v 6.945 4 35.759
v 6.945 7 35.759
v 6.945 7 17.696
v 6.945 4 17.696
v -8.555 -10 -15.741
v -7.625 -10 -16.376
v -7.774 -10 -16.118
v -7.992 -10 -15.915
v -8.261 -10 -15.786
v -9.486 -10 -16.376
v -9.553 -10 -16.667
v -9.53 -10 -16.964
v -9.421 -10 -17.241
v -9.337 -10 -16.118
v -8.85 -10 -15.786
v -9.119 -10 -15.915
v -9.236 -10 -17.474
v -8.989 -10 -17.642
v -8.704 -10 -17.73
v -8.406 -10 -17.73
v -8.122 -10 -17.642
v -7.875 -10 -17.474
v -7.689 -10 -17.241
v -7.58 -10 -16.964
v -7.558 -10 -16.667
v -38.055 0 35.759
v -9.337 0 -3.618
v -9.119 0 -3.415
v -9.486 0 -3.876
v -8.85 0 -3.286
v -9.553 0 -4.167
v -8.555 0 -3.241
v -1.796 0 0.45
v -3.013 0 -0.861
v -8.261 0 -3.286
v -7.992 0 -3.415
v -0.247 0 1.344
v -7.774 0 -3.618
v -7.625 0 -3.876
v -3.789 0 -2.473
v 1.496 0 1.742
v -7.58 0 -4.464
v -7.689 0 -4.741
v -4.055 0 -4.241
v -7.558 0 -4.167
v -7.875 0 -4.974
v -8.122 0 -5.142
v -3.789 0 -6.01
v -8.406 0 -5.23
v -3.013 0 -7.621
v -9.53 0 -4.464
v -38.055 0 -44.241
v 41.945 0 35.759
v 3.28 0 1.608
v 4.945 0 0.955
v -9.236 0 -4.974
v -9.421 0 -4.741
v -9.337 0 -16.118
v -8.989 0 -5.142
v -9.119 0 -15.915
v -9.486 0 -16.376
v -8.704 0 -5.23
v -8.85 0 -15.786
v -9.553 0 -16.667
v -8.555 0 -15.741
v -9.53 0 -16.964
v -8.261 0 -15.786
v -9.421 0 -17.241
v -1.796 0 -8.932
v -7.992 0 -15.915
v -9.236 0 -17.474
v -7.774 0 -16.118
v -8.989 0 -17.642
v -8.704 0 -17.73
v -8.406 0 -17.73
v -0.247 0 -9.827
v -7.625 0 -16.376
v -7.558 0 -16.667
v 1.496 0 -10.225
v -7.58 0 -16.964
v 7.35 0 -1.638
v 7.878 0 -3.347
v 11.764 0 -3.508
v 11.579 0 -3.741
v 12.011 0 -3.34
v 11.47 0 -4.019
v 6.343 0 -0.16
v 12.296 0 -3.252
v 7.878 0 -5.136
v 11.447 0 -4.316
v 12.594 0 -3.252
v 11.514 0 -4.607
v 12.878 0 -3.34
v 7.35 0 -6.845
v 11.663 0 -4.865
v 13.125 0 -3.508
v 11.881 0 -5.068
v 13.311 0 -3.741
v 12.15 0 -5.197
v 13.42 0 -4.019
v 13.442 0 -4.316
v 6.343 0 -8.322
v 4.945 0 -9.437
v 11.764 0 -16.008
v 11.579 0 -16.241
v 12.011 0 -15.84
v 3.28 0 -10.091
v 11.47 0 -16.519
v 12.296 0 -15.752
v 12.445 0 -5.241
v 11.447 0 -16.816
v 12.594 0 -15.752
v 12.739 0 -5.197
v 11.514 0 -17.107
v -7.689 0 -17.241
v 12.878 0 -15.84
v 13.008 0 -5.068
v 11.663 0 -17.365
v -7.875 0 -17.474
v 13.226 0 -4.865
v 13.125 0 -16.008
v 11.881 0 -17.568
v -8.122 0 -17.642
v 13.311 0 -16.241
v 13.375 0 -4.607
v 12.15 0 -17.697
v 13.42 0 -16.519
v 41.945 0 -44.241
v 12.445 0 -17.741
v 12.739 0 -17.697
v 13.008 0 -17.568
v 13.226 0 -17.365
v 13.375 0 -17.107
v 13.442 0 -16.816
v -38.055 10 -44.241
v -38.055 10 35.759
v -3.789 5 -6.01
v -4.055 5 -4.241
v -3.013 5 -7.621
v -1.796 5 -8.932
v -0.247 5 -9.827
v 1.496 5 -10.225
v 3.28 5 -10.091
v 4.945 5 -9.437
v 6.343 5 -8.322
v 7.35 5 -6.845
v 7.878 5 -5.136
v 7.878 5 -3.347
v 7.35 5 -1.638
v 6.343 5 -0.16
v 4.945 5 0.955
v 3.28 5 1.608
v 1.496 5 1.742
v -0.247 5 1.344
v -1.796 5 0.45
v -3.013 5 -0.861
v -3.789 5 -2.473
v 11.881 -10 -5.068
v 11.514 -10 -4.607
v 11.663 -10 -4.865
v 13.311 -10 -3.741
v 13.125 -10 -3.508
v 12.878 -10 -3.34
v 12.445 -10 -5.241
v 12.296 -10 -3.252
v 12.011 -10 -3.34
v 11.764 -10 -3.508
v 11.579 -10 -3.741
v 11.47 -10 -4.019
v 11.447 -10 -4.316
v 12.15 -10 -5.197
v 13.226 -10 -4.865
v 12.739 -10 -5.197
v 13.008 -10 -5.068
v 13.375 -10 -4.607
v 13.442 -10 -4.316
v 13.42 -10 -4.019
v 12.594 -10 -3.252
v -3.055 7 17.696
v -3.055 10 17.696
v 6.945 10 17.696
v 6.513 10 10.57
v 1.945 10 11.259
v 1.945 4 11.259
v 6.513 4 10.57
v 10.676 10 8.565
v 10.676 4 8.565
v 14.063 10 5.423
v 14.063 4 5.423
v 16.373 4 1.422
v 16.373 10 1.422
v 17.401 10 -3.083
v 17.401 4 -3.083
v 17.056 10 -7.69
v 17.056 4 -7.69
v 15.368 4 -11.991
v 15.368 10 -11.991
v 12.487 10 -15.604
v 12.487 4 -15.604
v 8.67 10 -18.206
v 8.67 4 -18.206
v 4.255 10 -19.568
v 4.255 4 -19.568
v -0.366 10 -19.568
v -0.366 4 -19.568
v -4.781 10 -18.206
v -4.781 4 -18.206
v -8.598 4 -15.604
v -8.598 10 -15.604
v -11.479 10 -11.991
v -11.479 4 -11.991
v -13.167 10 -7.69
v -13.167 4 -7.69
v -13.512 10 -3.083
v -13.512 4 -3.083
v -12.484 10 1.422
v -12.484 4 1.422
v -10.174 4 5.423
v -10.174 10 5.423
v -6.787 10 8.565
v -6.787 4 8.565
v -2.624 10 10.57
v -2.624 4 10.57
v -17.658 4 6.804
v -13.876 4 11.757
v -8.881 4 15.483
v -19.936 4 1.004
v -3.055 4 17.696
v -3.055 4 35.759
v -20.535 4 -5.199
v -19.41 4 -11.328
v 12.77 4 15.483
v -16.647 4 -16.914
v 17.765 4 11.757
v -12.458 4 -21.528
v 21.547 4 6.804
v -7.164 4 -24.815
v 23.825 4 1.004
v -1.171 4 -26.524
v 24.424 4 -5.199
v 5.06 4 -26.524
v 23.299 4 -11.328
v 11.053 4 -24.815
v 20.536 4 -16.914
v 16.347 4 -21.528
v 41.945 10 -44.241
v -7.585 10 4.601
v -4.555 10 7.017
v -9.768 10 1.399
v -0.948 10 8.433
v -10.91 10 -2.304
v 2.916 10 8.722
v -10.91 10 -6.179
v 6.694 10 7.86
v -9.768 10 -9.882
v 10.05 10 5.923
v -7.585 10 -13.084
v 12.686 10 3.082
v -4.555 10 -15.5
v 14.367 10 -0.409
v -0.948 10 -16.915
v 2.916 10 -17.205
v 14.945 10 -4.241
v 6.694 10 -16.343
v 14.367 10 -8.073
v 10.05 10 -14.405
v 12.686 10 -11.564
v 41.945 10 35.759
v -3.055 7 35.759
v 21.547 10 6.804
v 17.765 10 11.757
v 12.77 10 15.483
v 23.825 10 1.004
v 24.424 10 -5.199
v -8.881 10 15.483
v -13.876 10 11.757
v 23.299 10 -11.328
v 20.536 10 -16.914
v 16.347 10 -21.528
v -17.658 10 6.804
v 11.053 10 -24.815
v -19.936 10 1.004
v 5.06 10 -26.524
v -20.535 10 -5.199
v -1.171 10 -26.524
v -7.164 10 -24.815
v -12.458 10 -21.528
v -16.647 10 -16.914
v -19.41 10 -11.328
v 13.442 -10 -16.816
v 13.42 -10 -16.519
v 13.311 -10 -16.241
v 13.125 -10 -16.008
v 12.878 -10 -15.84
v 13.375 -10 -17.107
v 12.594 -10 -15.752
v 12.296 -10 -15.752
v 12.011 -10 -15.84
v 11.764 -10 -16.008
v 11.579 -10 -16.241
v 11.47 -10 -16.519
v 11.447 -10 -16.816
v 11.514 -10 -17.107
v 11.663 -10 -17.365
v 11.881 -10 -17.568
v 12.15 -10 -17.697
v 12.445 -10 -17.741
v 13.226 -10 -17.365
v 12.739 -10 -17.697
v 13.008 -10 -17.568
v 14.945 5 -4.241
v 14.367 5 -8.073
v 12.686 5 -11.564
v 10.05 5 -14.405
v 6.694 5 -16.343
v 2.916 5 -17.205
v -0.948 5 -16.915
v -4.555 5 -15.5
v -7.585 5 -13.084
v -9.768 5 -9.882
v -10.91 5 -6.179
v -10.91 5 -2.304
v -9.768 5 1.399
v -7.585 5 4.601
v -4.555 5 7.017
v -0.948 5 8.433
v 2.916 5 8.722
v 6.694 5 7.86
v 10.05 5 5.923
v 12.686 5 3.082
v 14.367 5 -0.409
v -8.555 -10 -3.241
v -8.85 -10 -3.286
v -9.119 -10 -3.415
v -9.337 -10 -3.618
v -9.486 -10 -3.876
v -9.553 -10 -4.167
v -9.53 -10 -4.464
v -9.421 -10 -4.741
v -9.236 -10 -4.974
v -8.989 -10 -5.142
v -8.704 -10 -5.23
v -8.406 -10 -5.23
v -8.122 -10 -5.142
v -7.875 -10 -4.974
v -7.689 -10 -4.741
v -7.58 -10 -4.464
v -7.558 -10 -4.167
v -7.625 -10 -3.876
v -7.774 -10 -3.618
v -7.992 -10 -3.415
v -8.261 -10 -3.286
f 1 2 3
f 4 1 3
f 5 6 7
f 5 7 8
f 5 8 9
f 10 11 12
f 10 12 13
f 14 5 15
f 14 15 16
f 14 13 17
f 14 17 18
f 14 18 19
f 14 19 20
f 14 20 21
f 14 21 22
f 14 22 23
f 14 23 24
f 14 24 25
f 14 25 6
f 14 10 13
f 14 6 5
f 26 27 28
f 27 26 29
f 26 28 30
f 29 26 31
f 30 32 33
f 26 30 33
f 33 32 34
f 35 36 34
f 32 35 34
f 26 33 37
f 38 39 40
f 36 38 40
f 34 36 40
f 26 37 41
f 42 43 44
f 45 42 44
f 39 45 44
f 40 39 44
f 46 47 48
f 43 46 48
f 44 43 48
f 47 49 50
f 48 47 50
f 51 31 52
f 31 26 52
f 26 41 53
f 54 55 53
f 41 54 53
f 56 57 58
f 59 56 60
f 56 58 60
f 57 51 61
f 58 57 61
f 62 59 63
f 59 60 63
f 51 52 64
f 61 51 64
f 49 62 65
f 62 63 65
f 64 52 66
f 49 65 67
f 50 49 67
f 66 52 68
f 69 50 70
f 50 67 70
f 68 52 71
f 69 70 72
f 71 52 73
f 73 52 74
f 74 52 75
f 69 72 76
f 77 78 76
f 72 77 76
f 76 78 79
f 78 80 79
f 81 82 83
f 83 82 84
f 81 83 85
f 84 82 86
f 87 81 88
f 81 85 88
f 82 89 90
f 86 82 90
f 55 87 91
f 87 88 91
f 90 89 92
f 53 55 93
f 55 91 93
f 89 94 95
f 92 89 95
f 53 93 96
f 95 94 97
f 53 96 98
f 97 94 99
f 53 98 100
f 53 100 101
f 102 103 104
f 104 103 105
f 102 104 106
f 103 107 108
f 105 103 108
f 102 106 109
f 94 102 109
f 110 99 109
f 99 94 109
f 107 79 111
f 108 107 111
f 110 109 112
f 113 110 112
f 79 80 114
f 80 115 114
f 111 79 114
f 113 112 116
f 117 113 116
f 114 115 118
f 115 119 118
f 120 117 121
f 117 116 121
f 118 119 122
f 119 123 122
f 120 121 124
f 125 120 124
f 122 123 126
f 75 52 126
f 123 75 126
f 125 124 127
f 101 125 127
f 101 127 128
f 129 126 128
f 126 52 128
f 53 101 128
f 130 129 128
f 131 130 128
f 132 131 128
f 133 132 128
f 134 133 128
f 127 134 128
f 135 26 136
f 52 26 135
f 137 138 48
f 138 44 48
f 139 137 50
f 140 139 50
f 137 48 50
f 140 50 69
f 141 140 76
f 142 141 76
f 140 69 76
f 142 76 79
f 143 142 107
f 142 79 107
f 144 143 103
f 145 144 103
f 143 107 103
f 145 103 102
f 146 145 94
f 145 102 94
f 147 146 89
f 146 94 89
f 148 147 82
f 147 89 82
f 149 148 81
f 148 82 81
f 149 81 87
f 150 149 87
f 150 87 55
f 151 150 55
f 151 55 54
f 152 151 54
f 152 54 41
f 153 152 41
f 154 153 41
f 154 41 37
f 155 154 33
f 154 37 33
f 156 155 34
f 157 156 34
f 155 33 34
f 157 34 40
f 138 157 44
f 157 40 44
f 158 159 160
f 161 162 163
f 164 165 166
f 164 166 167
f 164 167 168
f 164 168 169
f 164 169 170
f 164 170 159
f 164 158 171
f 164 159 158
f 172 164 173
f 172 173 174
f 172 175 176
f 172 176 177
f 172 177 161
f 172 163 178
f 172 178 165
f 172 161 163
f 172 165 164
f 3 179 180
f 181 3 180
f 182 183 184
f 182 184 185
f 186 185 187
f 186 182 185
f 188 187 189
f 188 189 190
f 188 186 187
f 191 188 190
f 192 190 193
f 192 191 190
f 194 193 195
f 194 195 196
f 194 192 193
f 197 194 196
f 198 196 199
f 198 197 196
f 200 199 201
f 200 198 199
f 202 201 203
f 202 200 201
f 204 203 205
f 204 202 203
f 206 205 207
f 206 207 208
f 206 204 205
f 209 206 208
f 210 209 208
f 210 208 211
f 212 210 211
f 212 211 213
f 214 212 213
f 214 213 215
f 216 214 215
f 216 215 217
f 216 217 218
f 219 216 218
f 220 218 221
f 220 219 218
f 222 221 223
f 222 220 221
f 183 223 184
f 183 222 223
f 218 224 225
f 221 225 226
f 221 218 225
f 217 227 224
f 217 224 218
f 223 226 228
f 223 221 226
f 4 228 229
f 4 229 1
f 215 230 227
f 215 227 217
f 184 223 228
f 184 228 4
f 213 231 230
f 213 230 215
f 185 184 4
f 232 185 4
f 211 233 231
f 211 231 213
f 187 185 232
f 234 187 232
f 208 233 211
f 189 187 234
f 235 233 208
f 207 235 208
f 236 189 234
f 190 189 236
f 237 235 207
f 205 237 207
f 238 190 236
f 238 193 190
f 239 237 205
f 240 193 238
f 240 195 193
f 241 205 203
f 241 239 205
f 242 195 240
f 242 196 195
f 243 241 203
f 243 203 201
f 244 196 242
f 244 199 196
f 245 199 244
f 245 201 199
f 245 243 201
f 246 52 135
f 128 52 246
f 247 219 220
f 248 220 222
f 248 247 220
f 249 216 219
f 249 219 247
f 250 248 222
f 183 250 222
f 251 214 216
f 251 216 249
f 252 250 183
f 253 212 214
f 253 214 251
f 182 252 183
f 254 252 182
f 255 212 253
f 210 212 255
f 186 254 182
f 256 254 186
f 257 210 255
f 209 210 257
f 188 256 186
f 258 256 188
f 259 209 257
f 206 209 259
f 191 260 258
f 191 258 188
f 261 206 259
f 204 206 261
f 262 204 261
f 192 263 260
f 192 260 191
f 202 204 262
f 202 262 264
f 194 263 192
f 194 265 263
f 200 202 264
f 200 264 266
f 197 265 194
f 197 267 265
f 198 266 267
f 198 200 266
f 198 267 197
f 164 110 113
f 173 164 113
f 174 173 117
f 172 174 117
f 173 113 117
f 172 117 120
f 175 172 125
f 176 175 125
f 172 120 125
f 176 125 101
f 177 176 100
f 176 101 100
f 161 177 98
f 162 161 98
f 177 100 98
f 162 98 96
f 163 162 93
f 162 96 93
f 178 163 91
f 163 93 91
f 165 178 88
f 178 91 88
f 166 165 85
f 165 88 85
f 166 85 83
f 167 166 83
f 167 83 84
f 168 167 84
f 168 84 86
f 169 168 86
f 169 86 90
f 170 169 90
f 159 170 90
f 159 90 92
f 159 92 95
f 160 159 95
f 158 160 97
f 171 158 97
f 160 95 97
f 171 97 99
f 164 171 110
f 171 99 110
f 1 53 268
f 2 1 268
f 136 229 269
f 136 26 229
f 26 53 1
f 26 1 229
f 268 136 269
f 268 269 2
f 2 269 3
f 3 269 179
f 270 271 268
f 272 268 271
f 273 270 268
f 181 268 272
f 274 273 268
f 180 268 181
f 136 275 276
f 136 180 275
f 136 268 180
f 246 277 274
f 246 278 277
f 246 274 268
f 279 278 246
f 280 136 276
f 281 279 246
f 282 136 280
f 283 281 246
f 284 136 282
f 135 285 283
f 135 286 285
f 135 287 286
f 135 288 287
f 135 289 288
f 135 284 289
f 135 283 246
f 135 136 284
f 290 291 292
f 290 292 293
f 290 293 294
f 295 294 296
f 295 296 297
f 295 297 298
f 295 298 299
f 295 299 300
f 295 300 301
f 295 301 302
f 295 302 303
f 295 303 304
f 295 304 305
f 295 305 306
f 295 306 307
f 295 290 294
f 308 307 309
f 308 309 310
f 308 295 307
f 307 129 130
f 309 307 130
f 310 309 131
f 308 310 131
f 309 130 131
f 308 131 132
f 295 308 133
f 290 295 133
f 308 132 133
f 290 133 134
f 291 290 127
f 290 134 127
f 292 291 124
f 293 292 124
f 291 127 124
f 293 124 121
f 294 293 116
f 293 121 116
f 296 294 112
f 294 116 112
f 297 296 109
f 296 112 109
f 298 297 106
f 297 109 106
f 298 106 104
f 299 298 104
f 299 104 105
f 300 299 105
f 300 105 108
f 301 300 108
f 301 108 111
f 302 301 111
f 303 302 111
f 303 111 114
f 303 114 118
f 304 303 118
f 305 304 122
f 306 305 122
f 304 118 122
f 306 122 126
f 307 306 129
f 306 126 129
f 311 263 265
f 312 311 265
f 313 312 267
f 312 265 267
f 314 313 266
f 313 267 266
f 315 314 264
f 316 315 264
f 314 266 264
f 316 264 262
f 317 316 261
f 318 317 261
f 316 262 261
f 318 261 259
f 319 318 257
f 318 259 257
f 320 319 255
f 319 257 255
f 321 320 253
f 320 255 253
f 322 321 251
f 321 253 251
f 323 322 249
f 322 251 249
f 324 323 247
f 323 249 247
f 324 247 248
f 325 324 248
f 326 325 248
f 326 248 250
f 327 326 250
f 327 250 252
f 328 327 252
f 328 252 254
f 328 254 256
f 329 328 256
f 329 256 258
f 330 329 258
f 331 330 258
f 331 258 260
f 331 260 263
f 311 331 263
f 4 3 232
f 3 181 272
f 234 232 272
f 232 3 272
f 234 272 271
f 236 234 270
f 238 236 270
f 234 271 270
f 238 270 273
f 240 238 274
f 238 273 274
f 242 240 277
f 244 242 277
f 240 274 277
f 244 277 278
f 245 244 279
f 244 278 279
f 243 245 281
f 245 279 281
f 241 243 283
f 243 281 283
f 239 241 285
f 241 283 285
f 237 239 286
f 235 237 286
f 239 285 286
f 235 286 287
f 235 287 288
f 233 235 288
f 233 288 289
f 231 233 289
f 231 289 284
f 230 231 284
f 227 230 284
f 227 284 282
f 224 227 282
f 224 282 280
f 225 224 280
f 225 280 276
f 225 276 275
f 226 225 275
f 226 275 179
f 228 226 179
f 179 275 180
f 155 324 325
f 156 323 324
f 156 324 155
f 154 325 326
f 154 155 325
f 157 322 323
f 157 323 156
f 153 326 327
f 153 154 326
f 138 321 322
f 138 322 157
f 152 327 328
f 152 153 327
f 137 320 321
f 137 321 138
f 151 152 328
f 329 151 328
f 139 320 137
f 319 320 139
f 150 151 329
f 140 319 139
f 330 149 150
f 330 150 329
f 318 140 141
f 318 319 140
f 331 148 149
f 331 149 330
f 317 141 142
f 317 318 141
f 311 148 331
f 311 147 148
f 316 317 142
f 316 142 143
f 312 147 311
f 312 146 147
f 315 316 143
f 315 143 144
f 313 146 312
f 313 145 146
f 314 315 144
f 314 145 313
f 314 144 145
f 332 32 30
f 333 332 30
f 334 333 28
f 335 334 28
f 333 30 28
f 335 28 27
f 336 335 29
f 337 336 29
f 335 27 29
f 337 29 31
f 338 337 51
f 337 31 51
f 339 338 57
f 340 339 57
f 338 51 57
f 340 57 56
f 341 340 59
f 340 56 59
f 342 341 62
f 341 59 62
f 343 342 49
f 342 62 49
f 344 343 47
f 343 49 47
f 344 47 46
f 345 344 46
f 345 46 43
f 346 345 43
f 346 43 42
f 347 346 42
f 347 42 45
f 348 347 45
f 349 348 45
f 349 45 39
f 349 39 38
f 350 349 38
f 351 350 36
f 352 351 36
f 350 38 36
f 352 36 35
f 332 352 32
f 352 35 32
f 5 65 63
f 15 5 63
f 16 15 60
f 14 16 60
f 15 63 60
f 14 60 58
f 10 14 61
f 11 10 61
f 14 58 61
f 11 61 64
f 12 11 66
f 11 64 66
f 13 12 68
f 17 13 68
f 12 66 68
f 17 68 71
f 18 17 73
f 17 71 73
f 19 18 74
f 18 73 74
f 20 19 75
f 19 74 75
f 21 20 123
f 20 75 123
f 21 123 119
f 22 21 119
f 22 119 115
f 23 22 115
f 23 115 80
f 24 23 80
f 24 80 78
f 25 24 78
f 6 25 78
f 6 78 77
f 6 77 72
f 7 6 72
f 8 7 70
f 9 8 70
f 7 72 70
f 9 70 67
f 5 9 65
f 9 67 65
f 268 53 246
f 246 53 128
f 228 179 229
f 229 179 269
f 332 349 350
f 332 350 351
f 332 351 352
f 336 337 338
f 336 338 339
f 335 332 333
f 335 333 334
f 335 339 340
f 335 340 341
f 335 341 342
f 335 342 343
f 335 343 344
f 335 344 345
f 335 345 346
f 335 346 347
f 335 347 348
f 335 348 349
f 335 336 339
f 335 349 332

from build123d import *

# Parameters (mm, degrees)
SKETCH28_W                                   = 80
SKETCH28_H                                   = 80
BOSS_EXTRUDE1_DEPTH                          = 10
CBORE_FOR_M10_CHEESE_HEAD_SCREW1_D           = 12
CBORE_FOR_M10_CHEESE_HEAD_SCREW1_CBORE_D     = 26
CBORE_FOR_M10_CHEESE_HEAD_SCREW1_CBORE_DEPTH = 5
SKETCH36_R                                   = 1
BOSS_EXTRUDE5_DEPTH                          = 10
SKETCH37_R                                   = 22.5
SKETCH37_R_2                                 = 15.5
CUT_EXTRUDE2_DEPTH                           = 6
CUT_EXTRUDE6_DEPTH                           = 6
SKETCH40_W                                   = 18.062589032
SKETCH40_H                                   = 3
BOSS_EXTRUDE7_DEPTH                          = 13


with BuildPart() as part:
    # Sketch28 → Boss-Extrude1 (new body)
    with BuildSketch(Plane(origin=(0, 0, 0), x_dir=(1, 0, 0), z_dir=(0, 1, 0))):
        with Locations((1.944585414, 4.241283073)):
            Rectangle(SKETCH28_W, SKETCH28_H)
    extrude(amount=BOSS_EXTRUDE1_DEPTH)

    # CBORE for M10 Cheese Head Screw1 (through all)
    with Locations(Plane(origin=(0, 10, 0), x_dir=(1, 0, 0), z_dir=(0, 1, 0))):
        with Locations((1.944585414, 4.241283073)):
            CounterBoreHole(CBORE_FOR_M10_CHEESE_HEAD_SCREW1_D / 2, CBORE_FOR_M10_CHEESE_HEAD_SCREW1_CBORE_D / 2, CBORE_FOR_M10_CHEESE_HEAD_SCREW1_CBORE_DEPTH)

    # Sketch36 → Boss-Extrude5 (add)
    with BuildSketch(Plane.XZ):
        with Locations(Location((12.444585414, -16.741283073, 0), (0, 0, 270))):
            Circle(SKETCH36_R)
        with Locations(Location((12.444585414, -4.241283073, 0), (0, 0, 270))):
            Circle(SKETCH36_R)
        with Locations(Location((-8.555414586, -16.741283073, 0), (0, 0, 90))):
            Circle(SKETCH36_R)
        with Locations(Location((-8.555414586, -4.241283073, 0), (0, 0, 90))):
            Circle(SKETCH36_R)
    extrude(amount=BOSS_EXTRUDE5_DEPTH)

    # Sketch37 → Cut-Extrude2 (cut)
    with BuildSketch(Plane(origin=(0, 10, 0), x_dir=(1, 0, 0), z_dir=(0, 1, 0))):
        with Locations(Location((1.944585414, 4.241283073, 0), (0, 0, 270))):
            Circle(SKETCH37_R)
        with Locations(Location((1.944585414, 4.241283073, 0), (0, 0, 270))):
            Circle(SKETCH37_R_2, mode=Mode.SUBTRACT)
    extrude(amount=-CUT_EXTRUDE2_DEPTH, mode=Mode.SUBTRACT)

    # Sketch39 → Cut-Extrude6 (cut)
    with BuildSketch(Plane(origin=(0, 10, 0), x_dir=(1, 0, 0), z_dir=(0, 1, 0))):
        with BuildLine():
            Line((6.944585414, -35.758716927), (6.944585414, -17.696127895))
            ThreePointArc((6.944585414, -17.696127895), (1.944585414, -18.258716927), (-3.055414586, -17.696127895))
            Line((-3.055414586, -17.696127895), (-3.055414586, -35.758716927))
            Line((-3.055414586, -35.758716927), (1.944585414, -35.758716927))
            Line((1.944585414, -35.758716927), (6.944585414, -35.758716927))
        make_face()
    extrude(amount=-CUT_EXTRUDE6_DEPTH, mode=Mode.SUBTRACT)

    # Sketch40 → Boss-Extrude7 (add)
    with BuildSketch(Plane(origin=(-3.055414586, 0, 0), x_dir=(0, 0, -1), z_dir=(1, 0, 0))):
        with Locations((-26.727422411, 8.5)):
            Rectangle(SKETCH40_W, SKETCH40_H)
    extrude(amount=BOSS_EXTRUDE7_DEPTH)


solid = part.part
